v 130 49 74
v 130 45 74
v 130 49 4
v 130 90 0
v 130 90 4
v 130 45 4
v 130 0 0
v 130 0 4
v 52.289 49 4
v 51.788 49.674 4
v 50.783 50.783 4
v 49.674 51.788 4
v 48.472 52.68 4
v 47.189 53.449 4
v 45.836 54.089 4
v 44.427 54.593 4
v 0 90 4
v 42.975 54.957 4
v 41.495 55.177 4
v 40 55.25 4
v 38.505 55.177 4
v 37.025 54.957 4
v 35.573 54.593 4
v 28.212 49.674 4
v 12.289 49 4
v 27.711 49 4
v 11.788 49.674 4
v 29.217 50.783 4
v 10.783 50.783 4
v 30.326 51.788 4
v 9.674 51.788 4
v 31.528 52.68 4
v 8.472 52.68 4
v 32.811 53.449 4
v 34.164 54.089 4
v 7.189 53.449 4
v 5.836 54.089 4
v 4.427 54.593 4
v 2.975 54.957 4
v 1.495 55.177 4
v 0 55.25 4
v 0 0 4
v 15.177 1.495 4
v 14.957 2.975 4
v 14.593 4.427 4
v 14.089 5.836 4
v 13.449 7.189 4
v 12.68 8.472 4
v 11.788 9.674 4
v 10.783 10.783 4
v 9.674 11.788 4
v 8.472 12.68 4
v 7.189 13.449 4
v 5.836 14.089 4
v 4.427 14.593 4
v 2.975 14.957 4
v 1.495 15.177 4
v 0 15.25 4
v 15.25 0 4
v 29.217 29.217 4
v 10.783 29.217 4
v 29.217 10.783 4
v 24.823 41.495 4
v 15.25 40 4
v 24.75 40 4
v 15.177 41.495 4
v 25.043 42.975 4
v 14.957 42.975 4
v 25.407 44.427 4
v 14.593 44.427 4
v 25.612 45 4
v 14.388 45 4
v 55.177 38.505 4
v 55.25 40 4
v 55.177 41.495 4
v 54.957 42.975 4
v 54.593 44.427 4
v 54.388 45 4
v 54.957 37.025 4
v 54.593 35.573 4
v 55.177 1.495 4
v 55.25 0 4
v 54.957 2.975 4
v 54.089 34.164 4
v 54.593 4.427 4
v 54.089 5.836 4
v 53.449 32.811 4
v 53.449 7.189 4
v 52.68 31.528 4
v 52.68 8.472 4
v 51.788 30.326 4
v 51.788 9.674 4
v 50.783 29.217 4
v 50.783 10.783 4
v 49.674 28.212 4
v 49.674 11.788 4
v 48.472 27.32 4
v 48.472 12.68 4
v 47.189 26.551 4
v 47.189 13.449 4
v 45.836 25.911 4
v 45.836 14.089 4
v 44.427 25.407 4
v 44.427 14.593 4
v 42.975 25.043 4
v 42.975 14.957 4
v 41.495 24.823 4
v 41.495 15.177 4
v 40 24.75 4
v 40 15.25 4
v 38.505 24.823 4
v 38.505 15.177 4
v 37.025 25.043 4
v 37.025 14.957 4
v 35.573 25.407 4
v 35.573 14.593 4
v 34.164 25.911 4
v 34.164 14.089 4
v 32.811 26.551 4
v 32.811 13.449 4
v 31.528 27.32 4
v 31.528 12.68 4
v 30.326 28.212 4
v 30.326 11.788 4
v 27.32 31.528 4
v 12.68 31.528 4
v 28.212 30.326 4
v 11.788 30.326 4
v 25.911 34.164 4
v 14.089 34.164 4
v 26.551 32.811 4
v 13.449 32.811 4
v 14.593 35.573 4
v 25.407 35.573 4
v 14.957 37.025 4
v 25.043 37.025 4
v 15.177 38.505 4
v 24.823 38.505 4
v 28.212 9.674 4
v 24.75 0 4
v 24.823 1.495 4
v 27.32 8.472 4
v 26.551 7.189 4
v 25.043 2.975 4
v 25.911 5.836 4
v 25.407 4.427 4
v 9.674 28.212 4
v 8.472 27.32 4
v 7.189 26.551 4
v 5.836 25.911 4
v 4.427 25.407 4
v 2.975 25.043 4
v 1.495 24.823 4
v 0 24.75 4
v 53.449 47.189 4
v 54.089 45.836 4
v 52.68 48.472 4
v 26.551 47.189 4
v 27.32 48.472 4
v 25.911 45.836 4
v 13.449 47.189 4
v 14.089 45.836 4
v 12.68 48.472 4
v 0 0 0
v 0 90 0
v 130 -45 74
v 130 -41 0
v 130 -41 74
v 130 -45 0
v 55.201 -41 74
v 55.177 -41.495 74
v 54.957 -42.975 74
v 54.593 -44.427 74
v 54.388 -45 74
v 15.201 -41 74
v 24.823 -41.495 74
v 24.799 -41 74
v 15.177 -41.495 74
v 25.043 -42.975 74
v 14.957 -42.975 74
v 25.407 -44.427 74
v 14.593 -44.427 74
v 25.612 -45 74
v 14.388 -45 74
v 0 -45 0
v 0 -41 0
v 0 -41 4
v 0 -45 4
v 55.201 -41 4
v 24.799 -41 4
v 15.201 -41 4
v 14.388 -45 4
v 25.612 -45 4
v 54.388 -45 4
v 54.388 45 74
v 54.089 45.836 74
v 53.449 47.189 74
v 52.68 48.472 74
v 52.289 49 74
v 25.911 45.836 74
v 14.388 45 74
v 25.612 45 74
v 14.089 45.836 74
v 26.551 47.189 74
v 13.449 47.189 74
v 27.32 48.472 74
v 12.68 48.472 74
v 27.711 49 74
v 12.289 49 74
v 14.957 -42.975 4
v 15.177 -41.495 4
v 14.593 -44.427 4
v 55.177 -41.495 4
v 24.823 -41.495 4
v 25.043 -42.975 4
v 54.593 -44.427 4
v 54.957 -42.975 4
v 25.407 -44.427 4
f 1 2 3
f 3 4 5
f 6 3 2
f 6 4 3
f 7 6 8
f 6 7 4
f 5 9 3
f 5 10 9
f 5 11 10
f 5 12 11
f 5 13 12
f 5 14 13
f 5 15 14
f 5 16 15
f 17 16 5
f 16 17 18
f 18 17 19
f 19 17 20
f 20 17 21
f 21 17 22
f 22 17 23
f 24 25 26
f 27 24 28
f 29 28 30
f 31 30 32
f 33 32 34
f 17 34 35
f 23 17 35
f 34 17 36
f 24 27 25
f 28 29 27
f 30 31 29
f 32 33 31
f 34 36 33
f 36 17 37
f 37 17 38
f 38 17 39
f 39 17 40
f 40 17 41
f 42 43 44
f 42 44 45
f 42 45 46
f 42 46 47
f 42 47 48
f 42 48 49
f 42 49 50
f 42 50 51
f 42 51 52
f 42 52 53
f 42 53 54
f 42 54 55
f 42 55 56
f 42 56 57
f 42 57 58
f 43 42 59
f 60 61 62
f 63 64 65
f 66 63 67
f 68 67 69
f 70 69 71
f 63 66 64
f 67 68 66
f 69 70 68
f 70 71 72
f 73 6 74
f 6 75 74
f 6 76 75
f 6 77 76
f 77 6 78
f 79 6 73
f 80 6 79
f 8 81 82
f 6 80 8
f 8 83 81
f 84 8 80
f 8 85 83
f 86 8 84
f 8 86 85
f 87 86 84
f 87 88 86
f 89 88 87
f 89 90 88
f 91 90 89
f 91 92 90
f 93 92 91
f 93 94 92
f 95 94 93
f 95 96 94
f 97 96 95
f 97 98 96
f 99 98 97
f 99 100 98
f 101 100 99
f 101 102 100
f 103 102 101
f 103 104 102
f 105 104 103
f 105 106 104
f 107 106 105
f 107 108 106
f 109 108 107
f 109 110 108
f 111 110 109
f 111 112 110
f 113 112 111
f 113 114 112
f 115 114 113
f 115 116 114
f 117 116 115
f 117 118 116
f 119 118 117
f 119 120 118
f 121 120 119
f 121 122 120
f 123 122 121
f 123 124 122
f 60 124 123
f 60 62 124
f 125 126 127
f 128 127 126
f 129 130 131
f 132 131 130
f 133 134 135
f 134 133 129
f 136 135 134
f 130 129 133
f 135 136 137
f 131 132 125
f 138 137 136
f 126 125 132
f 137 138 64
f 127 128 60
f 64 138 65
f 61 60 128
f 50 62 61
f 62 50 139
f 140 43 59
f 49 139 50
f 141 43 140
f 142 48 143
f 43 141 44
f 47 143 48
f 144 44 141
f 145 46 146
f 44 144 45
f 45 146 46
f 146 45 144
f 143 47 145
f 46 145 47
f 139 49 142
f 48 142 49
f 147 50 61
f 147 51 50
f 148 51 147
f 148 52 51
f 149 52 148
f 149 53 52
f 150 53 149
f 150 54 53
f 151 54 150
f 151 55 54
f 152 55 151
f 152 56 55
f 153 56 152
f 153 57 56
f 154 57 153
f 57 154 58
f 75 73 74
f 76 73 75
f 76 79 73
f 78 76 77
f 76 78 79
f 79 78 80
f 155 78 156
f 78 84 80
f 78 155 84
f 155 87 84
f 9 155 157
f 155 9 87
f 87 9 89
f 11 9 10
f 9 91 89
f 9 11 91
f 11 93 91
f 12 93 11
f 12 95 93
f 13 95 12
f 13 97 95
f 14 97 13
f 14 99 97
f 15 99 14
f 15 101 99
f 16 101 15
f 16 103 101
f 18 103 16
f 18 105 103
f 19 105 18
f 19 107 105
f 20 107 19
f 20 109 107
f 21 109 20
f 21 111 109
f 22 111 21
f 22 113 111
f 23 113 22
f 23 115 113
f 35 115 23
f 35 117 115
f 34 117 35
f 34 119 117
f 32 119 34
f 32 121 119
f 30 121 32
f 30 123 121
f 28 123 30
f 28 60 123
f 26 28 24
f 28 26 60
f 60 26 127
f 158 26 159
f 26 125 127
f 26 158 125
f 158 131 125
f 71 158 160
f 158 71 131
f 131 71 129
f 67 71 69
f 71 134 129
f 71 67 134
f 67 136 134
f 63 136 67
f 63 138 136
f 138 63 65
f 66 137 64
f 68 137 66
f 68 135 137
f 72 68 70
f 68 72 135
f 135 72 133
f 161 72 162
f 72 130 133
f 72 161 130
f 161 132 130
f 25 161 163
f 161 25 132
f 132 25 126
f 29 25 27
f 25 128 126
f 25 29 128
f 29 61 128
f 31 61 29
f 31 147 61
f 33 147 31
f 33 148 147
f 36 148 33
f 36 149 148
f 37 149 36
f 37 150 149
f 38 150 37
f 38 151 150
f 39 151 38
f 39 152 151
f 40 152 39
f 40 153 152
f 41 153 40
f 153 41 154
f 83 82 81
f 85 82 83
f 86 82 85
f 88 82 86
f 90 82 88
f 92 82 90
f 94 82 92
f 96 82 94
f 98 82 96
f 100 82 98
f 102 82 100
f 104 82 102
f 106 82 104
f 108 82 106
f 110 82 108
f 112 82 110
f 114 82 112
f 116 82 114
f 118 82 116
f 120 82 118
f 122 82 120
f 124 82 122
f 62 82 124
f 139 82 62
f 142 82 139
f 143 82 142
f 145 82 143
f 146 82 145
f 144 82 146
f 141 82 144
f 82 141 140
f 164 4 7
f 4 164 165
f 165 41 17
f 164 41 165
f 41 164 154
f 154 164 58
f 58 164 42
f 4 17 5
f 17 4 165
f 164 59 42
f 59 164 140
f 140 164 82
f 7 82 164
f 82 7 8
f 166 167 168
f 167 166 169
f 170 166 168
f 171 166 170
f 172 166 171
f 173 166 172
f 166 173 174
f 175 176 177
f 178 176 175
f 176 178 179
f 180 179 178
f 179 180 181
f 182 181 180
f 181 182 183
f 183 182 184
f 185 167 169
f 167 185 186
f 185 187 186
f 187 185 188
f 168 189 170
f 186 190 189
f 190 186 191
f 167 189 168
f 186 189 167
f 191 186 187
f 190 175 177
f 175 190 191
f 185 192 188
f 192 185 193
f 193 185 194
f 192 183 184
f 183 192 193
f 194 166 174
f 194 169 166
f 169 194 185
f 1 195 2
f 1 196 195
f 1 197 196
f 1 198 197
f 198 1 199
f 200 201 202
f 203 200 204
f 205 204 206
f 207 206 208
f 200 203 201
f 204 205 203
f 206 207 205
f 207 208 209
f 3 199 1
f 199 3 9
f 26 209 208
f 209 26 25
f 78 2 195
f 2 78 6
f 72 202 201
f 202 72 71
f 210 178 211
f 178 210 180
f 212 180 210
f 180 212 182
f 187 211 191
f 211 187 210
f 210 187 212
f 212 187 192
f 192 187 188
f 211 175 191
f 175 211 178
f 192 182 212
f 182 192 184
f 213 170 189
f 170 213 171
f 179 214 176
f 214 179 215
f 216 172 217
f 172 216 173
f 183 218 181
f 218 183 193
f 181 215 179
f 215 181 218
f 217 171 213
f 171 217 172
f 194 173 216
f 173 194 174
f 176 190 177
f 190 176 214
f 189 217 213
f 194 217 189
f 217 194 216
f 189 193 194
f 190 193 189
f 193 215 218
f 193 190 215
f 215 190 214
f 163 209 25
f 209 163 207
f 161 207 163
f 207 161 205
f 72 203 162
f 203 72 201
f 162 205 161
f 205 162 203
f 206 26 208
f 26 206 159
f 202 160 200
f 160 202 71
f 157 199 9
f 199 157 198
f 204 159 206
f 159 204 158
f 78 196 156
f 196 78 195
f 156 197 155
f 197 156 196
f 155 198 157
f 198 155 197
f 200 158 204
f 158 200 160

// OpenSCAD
// Rack for six 50 mL conical (Falcon-type) tubes.
// Print orientation: Flat plate on bed (z=0), walls rising to z=70.
// After printing, flip over so walls are on the bed and tubes hang down.

// Plate dimensions
L     = 130; // Length (X)
W     = 90;  // Width (Y)
t     = 4;   // Plate thickness (Z)

// Hole specifications
n_holes = 6;
hole_d  = 30.5; // Diameter

// Grid layout
row_spacing = 40; // Centre-to-centre Y
col_spacing = 40; // Centre-to-centre X

// Wall specifications
wall_h = 70; // Height of walls from plate top (z=4)
wall_t = 4;  // Thickness of walls (Y)

// Derived positions
// Centred on origin in X and Y for the whole assembly
// Rows along Y: 3 holes. Centres at -40, 0, 40.
// Cols along X: 3 holes. Centres at -40, 0, 40.
// Plate top surface is at z = t.

$fn = 64;

// Define the main body (Plate + Walls)
module rack_body() {
    // 1. The flat plate
    translate([0, 0, 0]) cube([L, W, t]);

    // 2. The two side walls
    // Left wall (at Y = -W/2)
    translate([0, -W/2, 0]) cube([L, wall_t, wall_h + t]);
    // Right wall (at Y = +W/2)
    translate([0, W/2, 0]) cube([L, wall_t, wall_h + t]);
}

// Define the holes
module holes() {
    // Calculate positions relative to the plate top (z=t)
    // We subtract t from the Z coordinate of the cutting cylinder so it starts at the plate surface
    // and goes down (negative Z) to cut through.
    
    // Y positions for 3 rows: -40, 0, 40
    y_pos = [-40, 0, 40];
    // X positions for 3 cols: -40, 0, 40
    x_pos = [-40, 0, 40];

    for (y = y_pos) {
        for (x = x_pos) {
            // Cut a cylinder through the plate and walls
            // The cylinder must extend slightly past the plate thickness to ensure clean cut
            // and past the wall height.
            translate([x, y, t]) 
                cylinder(h = wall_h + t + 1, d = hole_d);
        }
    }
}

difference() {
    union() {
        rack_body();
    }
    holes();
}
